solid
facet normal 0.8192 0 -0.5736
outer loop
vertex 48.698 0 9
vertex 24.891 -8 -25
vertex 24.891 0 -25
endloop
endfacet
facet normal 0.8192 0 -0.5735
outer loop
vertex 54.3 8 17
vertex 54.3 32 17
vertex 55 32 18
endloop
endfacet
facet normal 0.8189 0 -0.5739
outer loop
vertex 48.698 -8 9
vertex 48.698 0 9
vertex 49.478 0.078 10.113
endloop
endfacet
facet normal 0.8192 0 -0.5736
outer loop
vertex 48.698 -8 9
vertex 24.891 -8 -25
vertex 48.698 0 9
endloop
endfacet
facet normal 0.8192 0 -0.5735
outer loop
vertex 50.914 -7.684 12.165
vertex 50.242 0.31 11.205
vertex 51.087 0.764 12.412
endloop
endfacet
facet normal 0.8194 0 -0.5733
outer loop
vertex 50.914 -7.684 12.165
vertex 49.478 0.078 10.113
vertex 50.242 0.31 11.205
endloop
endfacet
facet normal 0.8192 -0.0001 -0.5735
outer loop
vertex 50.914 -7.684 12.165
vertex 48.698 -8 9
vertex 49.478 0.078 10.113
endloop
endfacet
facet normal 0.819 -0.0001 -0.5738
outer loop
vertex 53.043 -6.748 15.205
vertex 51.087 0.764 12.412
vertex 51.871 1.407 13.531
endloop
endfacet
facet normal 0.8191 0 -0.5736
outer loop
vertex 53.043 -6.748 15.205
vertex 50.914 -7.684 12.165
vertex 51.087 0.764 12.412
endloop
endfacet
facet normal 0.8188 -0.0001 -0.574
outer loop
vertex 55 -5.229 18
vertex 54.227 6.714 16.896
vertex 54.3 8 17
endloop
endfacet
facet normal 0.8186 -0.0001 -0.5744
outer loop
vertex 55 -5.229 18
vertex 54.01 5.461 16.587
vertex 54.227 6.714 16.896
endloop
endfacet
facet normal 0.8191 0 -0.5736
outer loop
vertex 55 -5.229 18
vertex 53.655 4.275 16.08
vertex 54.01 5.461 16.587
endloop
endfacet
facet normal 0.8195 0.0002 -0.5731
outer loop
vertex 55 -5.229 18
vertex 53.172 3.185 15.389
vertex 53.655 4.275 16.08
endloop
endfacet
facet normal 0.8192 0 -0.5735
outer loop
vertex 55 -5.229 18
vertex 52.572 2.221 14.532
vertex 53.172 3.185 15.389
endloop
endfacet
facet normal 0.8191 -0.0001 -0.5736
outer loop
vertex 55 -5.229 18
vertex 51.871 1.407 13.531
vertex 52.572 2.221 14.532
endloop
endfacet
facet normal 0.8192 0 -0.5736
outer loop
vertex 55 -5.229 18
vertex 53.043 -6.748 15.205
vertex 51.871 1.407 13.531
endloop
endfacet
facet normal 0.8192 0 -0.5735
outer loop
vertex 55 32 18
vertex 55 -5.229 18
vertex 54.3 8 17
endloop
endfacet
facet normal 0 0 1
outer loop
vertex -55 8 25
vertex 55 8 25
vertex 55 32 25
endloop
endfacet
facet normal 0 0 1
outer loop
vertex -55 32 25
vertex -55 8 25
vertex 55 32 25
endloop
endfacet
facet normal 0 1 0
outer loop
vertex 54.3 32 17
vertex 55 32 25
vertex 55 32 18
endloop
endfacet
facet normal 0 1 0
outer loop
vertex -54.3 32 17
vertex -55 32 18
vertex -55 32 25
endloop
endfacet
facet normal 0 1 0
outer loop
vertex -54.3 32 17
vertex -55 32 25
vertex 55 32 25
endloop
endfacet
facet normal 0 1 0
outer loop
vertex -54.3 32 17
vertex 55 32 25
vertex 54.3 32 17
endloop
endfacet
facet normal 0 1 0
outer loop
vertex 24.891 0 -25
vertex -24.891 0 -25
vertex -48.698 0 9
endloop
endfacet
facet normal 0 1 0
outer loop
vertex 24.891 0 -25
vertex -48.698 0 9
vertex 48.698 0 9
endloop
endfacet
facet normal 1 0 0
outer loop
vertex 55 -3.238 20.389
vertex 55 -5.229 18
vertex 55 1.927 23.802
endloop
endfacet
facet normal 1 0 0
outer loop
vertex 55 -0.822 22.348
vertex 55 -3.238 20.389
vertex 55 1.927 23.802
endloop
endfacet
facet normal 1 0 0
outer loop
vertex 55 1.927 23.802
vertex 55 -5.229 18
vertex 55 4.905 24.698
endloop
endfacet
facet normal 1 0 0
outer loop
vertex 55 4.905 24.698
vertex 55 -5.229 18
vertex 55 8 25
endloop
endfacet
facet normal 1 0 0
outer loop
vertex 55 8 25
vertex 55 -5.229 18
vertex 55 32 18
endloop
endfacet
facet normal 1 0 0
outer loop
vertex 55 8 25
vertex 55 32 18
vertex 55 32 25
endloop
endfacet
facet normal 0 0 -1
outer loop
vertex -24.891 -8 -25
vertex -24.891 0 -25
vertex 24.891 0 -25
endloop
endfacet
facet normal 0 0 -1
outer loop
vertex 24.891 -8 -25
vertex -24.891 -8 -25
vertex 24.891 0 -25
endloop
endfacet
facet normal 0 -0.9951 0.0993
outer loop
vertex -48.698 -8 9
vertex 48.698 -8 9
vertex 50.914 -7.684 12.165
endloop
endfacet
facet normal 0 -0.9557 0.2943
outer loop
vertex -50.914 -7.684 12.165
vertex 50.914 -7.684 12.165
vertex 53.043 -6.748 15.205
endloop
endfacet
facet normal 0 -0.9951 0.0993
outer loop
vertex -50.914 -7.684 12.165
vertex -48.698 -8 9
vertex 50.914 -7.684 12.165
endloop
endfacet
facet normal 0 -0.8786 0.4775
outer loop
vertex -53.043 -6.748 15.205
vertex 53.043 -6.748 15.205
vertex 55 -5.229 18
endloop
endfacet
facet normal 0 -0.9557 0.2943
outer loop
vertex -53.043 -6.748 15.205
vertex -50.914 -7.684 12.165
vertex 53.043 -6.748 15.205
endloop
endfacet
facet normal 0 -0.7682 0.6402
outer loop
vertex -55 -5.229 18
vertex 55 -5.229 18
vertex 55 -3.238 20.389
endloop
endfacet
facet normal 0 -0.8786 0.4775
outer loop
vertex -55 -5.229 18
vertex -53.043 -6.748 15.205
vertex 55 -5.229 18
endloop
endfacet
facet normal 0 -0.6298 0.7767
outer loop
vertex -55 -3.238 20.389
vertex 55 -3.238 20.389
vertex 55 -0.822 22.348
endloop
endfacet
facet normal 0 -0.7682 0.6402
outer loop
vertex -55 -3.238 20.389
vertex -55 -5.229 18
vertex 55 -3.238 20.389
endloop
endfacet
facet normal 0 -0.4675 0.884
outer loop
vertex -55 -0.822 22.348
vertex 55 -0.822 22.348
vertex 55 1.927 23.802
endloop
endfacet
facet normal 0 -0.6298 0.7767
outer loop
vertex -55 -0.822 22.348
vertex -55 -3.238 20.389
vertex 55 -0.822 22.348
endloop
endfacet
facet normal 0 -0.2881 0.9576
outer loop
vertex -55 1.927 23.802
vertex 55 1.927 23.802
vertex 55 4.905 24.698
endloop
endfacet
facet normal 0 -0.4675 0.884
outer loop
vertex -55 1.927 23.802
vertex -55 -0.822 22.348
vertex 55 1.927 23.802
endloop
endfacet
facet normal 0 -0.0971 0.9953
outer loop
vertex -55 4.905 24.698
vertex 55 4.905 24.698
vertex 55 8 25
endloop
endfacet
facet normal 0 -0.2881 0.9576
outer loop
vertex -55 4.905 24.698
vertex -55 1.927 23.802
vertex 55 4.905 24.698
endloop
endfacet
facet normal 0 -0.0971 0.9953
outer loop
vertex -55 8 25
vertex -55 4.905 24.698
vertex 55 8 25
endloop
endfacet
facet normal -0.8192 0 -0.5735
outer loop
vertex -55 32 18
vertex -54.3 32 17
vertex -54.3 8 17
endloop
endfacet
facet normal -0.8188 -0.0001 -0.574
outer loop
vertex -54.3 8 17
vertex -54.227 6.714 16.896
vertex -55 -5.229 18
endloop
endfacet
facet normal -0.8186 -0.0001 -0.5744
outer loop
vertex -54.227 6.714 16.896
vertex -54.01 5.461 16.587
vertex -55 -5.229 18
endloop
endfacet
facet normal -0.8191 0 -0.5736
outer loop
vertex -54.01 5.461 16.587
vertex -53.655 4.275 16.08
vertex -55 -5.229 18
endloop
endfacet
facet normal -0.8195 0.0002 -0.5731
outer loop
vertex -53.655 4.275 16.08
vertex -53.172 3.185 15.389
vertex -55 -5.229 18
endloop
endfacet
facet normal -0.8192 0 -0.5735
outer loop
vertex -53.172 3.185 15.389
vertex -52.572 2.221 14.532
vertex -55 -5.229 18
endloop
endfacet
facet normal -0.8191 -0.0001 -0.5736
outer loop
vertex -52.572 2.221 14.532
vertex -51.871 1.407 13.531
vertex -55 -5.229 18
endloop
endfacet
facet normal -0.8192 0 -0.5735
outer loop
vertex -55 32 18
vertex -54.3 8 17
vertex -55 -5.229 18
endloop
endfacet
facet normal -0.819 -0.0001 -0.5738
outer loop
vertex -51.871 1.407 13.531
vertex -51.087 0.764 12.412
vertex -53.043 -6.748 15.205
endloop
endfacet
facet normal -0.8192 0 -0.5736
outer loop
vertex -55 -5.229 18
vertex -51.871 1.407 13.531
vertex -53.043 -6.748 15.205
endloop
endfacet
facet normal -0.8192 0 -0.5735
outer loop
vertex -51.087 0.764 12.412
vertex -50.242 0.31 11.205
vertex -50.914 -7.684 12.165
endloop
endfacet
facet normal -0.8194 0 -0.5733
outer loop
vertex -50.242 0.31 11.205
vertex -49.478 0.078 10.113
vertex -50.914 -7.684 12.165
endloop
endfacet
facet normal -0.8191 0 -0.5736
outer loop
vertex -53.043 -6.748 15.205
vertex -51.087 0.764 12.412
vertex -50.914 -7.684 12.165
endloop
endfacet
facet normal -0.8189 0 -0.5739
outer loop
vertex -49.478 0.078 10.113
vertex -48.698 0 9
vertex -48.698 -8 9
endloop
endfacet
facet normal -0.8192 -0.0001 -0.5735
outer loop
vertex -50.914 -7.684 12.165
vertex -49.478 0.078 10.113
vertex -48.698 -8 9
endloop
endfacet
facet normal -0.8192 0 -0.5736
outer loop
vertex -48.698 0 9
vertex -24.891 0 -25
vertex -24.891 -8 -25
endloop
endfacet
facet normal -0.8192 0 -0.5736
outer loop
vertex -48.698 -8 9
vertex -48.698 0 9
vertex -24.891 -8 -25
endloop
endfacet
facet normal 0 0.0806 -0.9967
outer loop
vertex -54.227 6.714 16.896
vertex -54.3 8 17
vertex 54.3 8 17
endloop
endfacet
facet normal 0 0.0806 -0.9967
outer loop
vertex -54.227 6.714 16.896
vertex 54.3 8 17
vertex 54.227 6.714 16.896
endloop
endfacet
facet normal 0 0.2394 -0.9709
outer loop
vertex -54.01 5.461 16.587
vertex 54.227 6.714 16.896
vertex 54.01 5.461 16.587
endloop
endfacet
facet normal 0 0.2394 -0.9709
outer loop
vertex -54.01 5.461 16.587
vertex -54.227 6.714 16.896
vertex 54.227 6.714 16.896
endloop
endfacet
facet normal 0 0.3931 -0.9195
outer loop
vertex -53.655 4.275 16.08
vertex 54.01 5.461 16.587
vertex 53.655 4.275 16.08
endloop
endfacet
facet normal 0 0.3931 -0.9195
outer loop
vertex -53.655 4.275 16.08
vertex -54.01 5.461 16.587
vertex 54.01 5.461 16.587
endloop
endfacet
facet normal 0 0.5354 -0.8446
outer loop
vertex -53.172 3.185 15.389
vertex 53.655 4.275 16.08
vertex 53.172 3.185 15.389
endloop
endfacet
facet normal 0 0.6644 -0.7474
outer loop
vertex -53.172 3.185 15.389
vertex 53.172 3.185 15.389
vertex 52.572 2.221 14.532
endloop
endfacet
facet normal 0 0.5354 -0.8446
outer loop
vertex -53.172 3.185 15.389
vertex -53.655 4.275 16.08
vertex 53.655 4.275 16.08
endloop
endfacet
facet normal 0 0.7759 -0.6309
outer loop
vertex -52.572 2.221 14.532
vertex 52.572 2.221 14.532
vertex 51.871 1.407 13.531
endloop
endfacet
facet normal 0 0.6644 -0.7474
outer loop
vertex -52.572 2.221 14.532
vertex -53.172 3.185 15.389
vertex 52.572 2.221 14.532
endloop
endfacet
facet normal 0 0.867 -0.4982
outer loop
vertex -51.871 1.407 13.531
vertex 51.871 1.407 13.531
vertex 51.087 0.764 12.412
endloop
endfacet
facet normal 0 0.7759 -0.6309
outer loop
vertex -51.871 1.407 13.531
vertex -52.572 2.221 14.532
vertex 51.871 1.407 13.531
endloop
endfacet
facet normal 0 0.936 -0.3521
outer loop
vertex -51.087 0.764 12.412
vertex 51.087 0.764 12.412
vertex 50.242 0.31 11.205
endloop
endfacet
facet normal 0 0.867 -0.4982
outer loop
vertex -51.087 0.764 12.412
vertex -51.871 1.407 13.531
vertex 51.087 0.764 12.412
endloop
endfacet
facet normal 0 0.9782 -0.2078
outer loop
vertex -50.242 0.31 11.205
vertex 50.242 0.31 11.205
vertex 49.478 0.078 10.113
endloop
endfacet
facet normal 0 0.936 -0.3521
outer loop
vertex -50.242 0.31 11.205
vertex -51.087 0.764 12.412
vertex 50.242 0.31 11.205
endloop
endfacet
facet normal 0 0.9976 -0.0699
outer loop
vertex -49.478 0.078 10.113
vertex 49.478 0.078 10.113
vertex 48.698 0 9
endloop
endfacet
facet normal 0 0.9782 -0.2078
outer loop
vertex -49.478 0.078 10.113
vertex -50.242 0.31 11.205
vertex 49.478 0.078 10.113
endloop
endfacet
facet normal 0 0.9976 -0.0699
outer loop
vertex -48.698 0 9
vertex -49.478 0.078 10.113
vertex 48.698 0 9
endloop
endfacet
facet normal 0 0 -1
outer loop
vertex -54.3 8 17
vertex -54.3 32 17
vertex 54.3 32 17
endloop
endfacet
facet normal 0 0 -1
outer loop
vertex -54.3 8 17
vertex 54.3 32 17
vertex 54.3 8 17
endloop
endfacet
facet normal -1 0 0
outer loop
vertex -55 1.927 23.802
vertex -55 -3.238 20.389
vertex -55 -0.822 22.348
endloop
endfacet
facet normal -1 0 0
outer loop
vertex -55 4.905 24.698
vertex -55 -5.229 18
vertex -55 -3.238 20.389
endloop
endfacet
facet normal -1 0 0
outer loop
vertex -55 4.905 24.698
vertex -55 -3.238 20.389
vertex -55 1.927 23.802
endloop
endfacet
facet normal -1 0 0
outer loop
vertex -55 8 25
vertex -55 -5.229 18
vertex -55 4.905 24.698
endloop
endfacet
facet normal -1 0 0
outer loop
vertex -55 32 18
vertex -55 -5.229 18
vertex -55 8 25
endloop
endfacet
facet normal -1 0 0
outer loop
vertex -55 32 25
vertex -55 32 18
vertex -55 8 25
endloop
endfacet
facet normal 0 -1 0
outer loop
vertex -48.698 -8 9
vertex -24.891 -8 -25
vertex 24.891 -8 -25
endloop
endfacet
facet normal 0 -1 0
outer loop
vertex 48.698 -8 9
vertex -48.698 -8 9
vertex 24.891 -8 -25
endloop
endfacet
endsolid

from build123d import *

# Parameters (mm, degrees)
SKETCH1_W                    = 110
SKETCH1_H                    = 50
BASE_FLANGE1_DEPTH           = 8
EDGE_FLANGE1_STRIP_W         = 48
EDGE_FLANGE1_STRIP_H         = 8
EDGE_FLANGE1_STRIP_CUT_DEPTH = 110
EDGE_FLANGE1_DEPTH           = 110
CHAMFER1_SIZE                = 43
CHAMFER1_SIZE2               = 30.108924143
MIRROR2_START                = 34.728986582
MIRROR2_OUTLINE_W            = 56
MIRROR2_OUTLINE_H            = 41
MIRROR2_DEPTH                = 24.663786763


# Read off the part's stored shape, not the designer's step: Mirror2
# Sheet-metal steps are written as plain solids
with BuildPart() as part:
    # Sketch1 → Base-Flange1 (new body)
    with BuildSketch(Plane(origin=(0, 0, 0), x_dir=(1, 0, 0), z_dir=(0, 1, 0))):
        Rectangle(SKETCH1_W, SKETCH1_H)
    extrude(amount=-BASE_FLANGE1_DEPTH)

    # Edge-Flange1 strip (across the edge) → Edge-Flange1 strip cut (cut)
    with BuildSketch(Plane(origin=(-55, 0, 25), x_dir=(0, 0, -1), z_dir=(1, 0, 0))):
        with Locations((-8, -4)):
            Rectangle(EDGE_FLANGE1_STRIP_W, EDGE_FLANGE1_STRIP_H)
    extrude(amount=EDGE_FLANGE1_STRIP_CUT_DEPTH, mode=Mode.SUBTRACT)

    # Edge-Flange1 section (across the edge) → Edge-Flange1 (add)
    with BuildSketch(Plane(origin=(-55, 0, 25), x_dir=(0, 0, -1), z_dir=(1, 0, 0))):
        with BuildLine():
            Line((0, 8), (0, 32))
            Line((0, 32), (8, 32))
            Line((8, 32), (8, 8))
            ThreePointArc((8, 8), (10.343145751, 2.343145751), (16, 0))
            Line((16, 0), (16, -8))
            ThreePointArc((16, -8), (4.686291501, -3.313708499), (0, 8))
        make_face()
    extrude(amount=EDGE_FLANGE1_DEPTH)

    # Chamfer1
    chamfer1_edges = [part.edges().sort_by_distance(p)[0] for p in [
        (-55, -4, -25),
    ]]
    chamfer1_side = [part.faces().sort_by_distance(p)[0] for p in [
        (-55, -0.640312424, -8),
    ]]
    chamfer(chamfer1_edges, length=CHAMFER1_SIZE, length2=CHAMFER1_SIZE2, reference=chamfer1_side[0])

    # Mirror2 outline → Mirror2 (cut)
    with BuildSketch(Plane(origin=(0, 0, 0), x_dir=(0.5735764363510512, 0, 0.8191520442889882), z_dir=(0.8191520442889882, 0, -0.5735764363510512)).offset(MIRROR2_START)):
        with Locations((20, -12.5)):
            Rectangle(MIRROR2_OUTLINE_W, MIRROR2_OUTLINE_H)
    extrude(amount=MIRROR2_DEPTH, mode=Mode.SUBTRACT)


solid = part.part
